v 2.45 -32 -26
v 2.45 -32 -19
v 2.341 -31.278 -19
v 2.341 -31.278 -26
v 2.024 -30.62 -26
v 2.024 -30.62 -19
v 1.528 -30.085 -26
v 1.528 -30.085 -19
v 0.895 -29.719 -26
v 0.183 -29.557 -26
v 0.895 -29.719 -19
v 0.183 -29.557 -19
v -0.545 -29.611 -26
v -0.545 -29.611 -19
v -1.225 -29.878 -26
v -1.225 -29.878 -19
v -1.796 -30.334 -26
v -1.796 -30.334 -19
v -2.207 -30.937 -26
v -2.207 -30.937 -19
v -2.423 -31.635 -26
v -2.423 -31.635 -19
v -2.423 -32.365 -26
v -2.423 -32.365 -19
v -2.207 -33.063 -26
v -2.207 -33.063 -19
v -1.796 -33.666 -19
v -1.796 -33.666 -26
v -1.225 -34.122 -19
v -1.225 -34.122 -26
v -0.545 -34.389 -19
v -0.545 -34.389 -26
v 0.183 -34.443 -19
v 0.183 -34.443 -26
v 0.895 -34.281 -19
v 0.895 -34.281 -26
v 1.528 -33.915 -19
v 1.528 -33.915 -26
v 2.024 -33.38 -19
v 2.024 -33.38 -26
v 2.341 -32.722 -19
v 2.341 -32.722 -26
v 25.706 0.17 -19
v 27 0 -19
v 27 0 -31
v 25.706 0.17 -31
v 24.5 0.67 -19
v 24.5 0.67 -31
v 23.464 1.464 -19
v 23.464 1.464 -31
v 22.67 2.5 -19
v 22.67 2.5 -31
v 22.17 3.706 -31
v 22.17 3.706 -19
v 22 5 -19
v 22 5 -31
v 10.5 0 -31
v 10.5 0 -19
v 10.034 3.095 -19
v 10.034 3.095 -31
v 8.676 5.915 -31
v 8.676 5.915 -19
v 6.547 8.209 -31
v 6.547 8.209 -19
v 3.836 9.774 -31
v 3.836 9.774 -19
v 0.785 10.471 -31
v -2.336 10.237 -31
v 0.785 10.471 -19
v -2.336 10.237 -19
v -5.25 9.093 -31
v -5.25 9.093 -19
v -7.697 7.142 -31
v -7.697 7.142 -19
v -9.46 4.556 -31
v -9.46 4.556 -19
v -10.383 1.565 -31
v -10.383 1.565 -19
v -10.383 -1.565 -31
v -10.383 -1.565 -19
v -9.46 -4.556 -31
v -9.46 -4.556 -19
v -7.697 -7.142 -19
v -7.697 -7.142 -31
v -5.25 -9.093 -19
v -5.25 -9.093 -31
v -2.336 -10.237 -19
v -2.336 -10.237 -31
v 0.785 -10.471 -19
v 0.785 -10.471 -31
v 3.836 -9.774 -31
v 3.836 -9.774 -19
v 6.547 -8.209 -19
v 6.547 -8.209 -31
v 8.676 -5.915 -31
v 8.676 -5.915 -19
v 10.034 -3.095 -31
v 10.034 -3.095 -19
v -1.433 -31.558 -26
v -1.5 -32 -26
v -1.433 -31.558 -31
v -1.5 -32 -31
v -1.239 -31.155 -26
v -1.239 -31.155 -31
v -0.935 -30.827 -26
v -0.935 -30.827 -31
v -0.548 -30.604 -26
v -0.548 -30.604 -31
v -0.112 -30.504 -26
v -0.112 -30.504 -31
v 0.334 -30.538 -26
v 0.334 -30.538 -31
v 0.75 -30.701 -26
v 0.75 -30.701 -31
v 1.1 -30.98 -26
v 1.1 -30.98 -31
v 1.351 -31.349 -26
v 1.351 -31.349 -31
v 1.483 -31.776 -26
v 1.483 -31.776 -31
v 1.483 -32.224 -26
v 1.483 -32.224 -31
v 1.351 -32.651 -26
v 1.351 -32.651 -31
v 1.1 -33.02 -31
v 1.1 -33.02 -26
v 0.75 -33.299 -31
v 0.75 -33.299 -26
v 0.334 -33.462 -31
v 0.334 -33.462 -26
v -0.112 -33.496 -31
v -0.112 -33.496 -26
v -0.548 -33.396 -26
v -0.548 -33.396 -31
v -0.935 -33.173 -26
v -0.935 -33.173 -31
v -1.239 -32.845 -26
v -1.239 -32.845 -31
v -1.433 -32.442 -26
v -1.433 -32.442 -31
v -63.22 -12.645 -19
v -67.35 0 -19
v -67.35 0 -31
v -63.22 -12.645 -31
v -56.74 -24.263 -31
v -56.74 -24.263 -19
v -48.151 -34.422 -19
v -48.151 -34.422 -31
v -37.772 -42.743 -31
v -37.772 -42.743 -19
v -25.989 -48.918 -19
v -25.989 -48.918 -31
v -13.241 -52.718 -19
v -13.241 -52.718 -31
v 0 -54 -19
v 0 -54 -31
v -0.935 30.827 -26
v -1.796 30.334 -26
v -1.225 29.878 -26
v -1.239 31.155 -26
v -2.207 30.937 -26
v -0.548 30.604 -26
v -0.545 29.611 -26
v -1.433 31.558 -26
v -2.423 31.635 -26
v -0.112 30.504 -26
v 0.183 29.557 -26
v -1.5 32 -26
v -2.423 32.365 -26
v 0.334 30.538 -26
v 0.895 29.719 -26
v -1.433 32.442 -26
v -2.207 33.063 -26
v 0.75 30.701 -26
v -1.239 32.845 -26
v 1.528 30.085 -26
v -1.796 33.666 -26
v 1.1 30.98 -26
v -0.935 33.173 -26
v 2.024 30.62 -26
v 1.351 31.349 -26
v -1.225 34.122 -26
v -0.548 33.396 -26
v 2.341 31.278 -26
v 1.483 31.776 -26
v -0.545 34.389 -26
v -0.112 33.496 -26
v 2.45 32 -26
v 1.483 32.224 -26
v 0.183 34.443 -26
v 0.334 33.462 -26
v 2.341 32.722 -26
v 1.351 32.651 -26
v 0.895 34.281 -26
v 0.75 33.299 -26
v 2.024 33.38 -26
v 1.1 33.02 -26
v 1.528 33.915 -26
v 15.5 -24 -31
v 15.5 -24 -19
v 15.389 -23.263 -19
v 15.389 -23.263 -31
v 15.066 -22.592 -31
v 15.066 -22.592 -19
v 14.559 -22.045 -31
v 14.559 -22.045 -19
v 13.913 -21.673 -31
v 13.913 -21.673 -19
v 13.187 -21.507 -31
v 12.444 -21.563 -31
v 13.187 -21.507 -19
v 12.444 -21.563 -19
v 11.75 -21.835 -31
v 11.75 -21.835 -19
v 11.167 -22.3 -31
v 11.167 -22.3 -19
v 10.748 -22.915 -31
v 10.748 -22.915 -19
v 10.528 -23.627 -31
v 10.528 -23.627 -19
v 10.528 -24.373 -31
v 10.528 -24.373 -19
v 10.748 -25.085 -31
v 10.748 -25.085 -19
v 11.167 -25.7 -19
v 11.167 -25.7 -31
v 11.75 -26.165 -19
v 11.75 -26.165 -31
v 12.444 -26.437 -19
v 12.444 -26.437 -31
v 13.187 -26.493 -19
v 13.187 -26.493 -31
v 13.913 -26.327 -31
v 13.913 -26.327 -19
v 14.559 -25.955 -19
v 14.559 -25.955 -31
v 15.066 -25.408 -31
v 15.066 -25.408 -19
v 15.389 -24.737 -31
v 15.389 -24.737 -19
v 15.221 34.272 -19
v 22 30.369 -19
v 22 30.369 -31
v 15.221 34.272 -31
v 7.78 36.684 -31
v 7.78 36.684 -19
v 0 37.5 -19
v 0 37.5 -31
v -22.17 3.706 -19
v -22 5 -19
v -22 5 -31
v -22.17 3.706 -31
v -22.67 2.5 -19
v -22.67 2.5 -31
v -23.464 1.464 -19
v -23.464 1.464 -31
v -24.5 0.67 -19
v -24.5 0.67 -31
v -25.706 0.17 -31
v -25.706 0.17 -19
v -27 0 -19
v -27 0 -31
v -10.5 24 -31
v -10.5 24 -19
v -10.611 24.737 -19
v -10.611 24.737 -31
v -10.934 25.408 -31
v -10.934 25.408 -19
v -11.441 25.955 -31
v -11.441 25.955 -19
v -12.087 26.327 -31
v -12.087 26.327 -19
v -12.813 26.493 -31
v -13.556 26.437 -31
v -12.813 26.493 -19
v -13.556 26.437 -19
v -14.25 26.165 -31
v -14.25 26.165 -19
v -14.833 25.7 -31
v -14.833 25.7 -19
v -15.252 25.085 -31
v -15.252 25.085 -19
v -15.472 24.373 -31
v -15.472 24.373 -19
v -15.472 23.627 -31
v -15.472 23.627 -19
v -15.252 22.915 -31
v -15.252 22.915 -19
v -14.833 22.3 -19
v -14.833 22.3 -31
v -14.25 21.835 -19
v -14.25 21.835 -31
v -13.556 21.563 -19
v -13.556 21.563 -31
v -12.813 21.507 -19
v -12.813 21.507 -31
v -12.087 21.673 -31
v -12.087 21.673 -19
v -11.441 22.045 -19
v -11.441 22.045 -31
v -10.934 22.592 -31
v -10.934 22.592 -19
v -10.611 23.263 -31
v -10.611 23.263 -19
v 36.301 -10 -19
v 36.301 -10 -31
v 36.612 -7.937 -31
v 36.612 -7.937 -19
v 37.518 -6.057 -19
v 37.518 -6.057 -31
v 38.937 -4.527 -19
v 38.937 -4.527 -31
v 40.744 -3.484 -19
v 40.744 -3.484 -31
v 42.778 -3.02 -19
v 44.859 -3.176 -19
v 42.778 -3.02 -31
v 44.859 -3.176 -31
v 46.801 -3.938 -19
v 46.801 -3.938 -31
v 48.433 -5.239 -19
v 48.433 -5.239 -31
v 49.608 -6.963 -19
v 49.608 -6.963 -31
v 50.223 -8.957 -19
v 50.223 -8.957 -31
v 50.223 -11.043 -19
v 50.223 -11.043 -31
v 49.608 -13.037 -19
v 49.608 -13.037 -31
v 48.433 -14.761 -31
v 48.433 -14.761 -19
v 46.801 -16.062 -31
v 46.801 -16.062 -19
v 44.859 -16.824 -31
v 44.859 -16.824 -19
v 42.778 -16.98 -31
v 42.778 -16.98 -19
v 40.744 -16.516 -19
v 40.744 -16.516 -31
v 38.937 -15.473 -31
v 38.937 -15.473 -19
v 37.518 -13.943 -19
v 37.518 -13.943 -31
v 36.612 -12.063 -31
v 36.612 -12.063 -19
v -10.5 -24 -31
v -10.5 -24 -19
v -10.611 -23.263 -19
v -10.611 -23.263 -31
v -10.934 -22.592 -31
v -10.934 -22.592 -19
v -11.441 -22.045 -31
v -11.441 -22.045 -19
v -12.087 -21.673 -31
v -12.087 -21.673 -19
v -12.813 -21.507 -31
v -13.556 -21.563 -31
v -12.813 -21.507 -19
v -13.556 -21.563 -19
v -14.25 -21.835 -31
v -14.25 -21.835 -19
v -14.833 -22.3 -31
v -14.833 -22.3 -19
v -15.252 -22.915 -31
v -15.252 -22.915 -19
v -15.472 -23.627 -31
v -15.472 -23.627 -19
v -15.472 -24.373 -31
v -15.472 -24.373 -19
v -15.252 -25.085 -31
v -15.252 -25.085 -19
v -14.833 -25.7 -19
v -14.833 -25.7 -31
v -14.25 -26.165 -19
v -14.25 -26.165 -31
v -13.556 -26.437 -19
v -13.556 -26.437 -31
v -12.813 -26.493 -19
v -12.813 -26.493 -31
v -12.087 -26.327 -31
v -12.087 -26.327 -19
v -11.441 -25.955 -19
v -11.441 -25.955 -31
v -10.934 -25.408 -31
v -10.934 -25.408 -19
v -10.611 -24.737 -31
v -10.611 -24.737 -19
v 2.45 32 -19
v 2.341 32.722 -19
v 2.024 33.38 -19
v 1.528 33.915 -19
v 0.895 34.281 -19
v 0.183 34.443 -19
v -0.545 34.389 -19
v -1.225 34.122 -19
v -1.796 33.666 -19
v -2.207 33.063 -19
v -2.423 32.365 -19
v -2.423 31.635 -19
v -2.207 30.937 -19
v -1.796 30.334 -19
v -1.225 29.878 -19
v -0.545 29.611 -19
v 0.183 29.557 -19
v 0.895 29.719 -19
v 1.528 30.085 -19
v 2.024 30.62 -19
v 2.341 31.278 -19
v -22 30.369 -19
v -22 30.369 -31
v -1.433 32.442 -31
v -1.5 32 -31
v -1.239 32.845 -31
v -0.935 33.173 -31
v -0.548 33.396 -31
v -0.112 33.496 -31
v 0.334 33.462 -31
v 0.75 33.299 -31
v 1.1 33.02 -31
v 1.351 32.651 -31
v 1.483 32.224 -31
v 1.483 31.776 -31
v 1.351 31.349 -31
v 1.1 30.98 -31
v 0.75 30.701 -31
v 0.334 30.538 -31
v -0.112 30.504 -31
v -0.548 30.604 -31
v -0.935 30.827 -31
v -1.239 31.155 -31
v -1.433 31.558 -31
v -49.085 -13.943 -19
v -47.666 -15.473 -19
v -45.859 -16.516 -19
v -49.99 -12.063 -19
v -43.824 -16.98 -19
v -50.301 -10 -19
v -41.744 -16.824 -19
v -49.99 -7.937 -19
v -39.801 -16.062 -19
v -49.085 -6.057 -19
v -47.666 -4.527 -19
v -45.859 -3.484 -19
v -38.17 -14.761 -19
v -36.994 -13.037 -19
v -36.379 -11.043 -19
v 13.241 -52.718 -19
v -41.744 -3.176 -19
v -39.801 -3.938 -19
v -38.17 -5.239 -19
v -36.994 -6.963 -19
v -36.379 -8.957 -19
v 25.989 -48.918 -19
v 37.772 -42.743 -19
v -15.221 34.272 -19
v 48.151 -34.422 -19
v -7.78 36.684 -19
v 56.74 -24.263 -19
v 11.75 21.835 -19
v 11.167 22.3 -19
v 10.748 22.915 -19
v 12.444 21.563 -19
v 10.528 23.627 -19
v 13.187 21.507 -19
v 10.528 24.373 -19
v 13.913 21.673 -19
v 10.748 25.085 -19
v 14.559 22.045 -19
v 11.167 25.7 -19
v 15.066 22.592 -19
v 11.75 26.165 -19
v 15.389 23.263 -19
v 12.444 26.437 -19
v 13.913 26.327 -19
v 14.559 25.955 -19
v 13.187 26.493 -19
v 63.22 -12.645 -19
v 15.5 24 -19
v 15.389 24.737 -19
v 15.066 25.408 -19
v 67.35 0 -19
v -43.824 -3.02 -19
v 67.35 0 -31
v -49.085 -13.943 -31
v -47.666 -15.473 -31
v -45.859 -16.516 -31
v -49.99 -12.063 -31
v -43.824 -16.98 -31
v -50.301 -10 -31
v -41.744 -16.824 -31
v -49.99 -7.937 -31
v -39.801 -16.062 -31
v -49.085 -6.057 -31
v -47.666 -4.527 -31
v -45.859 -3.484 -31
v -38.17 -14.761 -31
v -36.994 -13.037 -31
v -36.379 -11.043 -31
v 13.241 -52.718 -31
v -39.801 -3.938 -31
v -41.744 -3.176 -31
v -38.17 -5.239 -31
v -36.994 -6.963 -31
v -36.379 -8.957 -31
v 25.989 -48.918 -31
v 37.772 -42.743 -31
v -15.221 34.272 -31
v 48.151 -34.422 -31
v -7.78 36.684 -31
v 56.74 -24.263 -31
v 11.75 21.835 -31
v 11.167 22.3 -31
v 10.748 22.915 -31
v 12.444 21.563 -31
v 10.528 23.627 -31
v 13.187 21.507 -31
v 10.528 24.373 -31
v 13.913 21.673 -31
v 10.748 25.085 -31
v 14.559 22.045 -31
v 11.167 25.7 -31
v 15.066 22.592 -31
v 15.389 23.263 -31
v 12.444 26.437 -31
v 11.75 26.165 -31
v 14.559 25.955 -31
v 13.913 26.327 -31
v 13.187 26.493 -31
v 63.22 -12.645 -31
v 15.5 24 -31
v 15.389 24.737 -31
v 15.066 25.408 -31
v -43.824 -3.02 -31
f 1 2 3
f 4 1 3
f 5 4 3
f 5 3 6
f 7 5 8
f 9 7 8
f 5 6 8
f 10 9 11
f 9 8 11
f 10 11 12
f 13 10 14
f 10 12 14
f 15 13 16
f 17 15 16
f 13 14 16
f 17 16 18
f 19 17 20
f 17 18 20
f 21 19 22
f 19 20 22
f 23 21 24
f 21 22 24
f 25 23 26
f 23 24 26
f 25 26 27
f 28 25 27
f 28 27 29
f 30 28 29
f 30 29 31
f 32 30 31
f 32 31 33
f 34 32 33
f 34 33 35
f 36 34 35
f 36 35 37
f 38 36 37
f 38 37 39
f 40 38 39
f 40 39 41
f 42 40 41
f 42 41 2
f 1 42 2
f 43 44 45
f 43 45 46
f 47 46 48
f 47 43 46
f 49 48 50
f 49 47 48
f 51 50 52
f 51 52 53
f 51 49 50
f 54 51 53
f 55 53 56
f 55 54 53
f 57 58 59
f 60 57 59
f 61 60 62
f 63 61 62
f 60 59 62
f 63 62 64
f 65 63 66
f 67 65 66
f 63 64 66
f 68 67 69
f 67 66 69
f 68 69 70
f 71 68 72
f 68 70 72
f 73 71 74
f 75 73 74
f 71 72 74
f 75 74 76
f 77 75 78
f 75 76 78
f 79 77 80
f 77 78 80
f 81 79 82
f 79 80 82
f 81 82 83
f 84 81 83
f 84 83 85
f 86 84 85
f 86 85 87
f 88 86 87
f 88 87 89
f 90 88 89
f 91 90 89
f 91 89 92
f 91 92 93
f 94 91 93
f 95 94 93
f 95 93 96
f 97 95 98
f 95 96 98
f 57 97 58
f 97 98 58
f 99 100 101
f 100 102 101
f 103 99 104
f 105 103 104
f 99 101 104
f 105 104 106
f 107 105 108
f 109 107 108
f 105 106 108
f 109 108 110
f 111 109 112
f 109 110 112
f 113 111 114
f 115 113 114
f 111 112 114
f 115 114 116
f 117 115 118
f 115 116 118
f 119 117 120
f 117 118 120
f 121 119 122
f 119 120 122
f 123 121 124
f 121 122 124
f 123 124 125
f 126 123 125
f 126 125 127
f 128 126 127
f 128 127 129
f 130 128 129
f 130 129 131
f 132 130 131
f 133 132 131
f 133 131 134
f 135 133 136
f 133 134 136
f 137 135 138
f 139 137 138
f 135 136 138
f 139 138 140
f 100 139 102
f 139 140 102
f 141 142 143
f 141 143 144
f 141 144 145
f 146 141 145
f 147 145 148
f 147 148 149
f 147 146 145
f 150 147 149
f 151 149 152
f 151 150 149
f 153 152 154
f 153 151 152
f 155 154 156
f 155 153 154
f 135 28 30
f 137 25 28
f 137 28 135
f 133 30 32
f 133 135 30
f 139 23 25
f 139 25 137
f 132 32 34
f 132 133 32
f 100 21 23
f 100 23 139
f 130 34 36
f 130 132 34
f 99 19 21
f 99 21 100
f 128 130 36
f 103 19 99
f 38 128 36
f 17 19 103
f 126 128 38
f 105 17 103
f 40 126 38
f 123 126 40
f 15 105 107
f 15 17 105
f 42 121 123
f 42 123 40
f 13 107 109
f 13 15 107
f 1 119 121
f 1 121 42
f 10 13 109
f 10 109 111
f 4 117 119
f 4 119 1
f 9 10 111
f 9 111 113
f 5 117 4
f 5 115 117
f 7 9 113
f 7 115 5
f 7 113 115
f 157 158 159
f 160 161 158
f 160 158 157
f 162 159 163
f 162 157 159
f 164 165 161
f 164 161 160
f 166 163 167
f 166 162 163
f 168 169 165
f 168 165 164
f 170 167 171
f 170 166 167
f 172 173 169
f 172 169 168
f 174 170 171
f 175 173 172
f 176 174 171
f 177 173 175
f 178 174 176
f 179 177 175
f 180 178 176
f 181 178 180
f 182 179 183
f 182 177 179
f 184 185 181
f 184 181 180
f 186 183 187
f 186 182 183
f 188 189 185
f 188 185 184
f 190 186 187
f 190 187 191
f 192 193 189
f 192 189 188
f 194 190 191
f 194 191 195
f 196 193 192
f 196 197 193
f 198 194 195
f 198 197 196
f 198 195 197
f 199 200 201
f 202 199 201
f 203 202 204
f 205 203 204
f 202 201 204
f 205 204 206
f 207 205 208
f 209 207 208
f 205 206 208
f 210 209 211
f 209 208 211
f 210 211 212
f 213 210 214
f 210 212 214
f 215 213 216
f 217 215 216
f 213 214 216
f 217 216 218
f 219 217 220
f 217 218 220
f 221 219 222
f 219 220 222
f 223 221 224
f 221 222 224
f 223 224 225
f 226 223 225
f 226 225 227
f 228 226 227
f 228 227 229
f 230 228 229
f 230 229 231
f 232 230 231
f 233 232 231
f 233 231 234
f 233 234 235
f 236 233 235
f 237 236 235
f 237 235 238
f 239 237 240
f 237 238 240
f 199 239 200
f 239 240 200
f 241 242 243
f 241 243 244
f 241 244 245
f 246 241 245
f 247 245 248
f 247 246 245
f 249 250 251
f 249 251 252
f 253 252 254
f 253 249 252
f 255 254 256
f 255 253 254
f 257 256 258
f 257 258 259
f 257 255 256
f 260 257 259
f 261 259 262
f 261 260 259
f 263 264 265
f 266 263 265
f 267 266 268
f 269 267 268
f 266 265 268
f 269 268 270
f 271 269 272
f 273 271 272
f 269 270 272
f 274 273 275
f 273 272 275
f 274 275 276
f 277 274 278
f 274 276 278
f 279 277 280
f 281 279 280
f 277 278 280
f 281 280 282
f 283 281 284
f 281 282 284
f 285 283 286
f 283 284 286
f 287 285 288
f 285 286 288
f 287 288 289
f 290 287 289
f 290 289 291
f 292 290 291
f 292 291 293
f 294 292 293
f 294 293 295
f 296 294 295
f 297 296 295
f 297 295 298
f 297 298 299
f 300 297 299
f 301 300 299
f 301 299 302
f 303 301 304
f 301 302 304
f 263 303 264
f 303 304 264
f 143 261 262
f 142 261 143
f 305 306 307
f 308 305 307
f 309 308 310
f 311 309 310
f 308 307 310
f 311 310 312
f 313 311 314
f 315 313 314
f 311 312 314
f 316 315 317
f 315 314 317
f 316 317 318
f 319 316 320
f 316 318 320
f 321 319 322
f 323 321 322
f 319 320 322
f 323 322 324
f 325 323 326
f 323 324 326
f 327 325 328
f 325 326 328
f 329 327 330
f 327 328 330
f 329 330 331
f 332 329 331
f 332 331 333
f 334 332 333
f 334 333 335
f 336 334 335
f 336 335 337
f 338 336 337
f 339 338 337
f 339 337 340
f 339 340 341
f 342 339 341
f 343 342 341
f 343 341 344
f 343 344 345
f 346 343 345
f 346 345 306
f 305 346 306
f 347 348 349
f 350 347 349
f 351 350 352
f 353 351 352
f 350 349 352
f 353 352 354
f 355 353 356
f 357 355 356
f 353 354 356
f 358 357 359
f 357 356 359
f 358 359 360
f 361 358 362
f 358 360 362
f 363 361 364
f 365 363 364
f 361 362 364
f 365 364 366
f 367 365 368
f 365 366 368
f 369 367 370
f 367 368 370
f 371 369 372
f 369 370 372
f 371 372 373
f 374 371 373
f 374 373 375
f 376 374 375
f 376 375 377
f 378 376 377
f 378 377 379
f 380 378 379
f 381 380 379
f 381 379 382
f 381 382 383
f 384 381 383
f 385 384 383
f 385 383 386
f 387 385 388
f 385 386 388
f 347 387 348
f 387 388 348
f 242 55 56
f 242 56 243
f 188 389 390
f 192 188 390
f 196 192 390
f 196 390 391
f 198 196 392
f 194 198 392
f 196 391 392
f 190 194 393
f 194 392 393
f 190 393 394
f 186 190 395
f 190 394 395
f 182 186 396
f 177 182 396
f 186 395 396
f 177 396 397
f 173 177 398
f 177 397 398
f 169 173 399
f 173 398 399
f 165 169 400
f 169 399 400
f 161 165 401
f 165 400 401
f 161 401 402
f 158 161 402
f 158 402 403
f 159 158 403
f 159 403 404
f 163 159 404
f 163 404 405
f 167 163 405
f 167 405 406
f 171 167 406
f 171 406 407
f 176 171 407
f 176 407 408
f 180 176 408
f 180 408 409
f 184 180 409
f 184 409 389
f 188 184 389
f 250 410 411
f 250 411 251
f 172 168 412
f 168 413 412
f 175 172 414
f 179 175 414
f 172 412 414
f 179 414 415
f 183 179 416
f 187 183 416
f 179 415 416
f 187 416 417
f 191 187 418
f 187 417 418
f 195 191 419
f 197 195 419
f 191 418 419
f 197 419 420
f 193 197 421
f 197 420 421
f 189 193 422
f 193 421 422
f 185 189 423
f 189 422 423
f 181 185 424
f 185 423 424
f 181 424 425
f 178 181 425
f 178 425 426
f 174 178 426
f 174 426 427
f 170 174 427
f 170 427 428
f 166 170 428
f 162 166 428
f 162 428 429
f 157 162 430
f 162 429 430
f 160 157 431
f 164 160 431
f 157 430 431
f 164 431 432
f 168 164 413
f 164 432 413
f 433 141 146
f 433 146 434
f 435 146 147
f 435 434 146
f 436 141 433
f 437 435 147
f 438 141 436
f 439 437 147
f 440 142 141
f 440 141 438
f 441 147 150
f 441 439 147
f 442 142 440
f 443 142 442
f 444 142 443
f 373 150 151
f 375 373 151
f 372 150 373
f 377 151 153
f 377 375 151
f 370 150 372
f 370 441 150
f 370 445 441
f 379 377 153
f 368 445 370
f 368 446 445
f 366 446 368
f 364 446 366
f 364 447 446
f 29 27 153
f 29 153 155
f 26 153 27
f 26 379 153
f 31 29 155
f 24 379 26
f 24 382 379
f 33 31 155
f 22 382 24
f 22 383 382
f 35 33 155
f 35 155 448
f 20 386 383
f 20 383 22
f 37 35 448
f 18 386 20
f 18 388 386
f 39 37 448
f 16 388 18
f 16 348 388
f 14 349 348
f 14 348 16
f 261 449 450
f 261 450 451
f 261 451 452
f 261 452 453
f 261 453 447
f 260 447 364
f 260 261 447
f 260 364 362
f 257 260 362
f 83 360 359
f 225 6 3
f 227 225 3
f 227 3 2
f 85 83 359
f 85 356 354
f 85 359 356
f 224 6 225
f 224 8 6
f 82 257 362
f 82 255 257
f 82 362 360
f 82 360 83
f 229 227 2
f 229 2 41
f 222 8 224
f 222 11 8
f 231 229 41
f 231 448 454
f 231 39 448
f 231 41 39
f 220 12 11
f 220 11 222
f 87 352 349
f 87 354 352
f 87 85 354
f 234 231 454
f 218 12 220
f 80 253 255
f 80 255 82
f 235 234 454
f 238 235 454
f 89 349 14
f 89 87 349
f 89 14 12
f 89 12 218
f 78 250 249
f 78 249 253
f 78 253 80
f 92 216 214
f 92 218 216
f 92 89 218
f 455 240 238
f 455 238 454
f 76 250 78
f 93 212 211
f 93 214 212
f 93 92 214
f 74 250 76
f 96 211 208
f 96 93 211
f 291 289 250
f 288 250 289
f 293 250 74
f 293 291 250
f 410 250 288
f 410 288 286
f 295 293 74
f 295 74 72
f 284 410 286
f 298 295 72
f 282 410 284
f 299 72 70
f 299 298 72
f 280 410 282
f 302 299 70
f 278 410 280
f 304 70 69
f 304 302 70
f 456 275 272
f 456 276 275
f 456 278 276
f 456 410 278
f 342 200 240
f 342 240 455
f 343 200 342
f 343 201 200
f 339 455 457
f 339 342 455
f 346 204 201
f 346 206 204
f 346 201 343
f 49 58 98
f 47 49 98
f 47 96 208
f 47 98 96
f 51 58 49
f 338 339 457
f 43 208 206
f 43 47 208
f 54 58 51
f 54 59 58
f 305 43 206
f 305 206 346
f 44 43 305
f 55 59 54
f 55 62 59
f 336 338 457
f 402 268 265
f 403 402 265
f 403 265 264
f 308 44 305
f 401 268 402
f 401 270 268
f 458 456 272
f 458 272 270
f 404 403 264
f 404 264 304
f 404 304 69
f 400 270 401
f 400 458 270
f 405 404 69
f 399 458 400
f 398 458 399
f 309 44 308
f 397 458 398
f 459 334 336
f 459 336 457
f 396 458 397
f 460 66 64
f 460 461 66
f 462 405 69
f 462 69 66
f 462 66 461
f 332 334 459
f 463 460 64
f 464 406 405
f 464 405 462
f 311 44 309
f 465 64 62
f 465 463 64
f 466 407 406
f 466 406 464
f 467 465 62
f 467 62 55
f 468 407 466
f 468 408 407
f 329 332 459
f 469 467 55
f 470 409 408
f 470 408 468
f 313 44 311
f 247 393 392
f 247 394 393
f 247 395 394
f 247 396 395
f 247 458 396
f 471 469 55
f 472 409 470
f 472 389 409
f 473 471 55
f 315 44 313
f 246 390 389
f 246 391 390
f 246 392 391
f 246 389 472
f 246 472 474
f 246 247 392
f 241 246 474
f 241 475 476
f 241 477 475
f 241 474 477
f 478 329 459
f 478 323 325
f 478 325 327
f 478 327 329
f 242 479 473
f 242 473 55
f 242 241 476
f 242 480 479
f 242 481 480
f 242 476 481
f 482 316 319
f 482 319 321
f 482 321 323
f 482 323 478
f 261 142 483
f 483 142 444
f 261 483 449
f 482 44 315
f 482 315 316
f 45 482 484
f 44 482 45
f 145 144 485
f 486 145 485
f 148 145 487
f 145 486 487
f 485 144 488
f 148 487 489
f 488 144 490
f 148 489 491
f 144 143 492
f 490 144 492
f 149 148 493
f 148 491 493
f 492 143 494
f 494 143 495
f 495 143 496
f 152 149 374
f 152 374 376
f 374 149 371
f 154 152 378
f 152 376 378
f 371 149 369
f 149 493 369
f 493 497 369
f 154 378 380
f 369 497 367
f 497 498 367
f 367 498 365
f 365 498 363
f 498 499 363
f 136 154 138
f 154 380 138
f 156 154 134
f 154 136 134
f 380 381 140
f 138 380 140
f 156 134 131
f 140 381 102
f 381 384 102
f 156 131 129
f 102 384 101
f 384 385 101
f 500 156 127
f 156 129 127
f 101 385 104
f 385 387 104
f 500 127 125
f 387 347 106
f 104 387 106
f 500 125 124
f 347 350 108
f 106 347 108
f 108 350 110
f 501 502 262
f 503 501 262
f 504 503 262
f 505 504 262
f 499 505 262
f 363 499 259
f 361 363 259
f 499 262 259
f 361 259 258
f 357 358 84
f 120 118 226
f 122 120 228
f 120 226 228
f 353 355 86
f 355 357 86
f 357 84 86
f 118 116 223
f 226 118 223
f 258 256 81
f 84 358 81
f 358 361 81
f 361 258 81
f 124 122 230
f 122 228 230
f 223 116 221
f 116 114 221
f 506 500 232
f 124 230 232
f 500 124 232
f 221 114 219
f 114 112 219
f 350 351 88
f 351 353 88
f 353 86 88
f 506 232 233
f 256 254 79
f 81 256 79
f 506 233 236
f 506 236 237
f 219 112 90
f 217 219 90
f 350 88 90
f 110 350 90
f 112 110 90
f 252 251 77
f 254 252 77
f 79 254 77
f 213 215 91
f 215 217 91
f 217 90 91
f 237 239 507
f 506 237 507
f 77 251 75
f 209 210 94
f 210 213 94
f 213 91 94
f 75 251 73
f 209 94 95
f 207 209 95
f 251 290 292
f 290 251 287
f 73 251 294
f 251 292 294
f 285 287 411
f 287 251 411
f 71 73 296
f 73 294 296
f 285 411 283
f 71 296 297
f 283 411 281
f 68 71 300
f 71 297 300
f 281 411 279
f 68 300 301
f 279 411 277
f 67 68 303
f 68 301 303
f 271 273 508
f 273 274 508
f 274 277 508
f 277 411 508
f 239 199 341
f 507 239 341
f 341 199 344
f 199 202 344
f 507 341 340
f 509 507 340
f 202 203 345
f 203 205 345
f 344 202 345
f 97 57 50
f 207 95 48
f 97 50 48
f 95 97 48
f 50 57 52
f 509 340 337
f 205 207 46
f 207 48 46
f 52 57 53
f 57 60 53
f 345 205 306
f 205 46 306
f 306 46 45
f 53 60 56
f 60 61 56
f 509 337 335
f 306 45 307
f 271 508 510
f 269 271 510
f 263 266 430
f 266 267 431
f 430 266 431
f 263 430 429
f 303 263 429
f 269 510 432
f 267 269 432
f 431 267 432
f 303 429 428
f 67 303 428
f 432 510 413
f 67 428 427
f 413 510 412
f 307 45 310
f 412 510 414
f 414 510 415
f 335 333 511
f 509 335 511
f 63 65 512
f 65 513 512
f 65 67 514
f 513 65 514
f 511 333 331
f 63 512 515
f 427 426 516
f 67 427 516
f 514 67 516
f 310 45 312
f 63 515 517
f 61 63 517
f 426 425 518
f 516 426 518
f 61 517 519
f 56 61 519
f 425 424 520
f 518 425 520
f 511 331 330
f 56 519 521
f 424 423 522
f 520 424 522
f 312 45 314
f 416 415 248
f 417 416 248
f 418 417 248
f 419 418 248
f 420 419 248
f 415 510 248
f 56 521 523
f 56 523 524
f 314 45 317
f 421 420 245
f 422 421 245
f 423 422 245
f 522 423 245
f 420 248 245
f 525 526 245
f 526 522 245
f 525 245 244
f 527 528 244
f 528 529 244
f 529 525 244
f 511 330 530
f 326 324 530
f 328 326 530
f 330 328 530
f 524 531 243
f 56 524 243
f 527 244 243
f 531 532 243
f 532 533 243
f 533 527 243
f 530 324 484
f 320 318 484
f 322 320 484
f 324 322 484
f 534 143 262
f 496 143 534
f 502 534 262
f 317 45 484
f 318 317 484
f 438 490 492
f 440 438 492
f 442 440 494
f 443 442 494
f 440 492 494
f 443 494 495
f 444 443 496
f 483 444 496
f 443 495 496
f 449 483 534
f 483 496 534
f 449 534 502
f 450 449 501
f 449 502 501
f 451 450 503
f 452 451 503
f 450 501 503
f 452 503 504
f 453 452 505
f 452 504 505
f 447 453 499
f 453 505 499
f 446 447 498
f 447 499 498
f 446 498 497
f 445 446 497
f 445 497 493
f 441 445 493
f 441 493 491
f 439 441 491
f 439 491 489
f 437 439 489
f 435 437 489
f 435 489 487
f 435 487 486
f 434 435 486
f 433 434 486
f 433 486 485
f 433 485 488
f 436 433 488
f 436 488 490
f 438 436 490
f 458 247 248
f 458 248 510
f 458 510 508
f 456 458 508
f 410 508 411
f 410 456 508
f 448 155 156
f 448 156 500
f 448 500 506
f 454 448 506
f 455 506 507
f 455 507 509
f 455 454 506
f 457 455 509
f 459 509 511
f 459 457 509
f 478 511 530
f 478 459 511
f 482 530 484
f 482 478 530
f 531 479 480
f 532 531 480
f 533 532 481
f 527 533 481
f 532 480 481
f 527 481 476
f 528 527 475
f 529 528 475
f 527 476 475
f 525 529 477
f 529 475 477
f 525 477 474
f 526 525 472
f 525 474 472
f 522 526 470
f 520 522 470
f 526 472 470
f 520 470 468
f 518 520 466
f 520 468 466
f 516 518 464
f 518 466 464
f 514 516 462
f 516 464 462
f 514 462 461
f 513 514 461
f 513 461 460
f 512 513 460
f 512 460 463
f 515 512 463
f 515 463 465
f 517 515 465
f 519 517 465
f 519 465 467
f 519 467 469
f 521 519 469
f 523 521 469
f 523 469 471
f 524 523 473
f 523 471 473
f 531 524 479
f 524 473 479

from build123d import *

# Parameters (mm, degrees)
F2_R           = 2.5
F2_R_2         = 10.5
F3_DEPTH       = 12
F4_D           = 3
F4_CBORE_D     = 4.9
F4_CBORE_DEPTH = 7
F5_D           = 14


with BuildPart() as f3:
    # F2 (on offset) → F3 (new body)
    with BuildSketch(Plane.XY.offset(-19)):
        with BuildLine():
            Line((-27, 0), (-67.349833, 0))
            ThreePointArc((-67.349833, 0), (-43.162484, -38.833075), (0, -54))
            ThreePointArc((0, -54), (43.162484, -38.833075), (67.349833, 0))
            Line((67.349833, 0), (27, 0))
            ThreePointArc((27, 0), (23.464466, 1.464466), (22, 5))
            Line((22, 5), (22, 30.368569))
            ThreePointArc((22, 30.368569), (11.563491, 35.672618), (0, 37.5))
            ThreePointArc((0, 37.5), (-11.563491, 35.672618), (-22, 30.368569))
            Line((-22, 30.368569), (-22, 5))
            ThreePointArc((-22, 5), (-23.464466, 1.464466), (-27, 0))
        make_face()
        with Locations((-13, -24)):
            Circle(F2_R, mode=Mode.SUBTRACT)
        with Locations((13, -24)):
            Circle(F2_R, mode=Mode.SUBTRACT)
        with Locations((-13, 24)):
            Circle(F2_R, mode=Mode.SUBTRACT)
        Circle(F2_R_2, mode=Mode.SUBTRACT)
        with Locations((13, 24)):
            Circle(F2_R, mode=Mode.SUBTRACT)
    extrude(amount=-F3_DEPTH)

    # F4 (through all)
    with Locations(Plane.XY.offset(-19)):
        with Locations((0, 32), (0, -32)):
            CounterBoreHole(F4_D / 2, F4_CBORE_D / 2, F4_CBORE_DEPTH)

    # F5 (through all)
    with Locations(Plane.XY):
        with Locations((-43.30127, -10), (43.30127, -10)):
            Hole(F5_D / 2)


solid = f3.part
